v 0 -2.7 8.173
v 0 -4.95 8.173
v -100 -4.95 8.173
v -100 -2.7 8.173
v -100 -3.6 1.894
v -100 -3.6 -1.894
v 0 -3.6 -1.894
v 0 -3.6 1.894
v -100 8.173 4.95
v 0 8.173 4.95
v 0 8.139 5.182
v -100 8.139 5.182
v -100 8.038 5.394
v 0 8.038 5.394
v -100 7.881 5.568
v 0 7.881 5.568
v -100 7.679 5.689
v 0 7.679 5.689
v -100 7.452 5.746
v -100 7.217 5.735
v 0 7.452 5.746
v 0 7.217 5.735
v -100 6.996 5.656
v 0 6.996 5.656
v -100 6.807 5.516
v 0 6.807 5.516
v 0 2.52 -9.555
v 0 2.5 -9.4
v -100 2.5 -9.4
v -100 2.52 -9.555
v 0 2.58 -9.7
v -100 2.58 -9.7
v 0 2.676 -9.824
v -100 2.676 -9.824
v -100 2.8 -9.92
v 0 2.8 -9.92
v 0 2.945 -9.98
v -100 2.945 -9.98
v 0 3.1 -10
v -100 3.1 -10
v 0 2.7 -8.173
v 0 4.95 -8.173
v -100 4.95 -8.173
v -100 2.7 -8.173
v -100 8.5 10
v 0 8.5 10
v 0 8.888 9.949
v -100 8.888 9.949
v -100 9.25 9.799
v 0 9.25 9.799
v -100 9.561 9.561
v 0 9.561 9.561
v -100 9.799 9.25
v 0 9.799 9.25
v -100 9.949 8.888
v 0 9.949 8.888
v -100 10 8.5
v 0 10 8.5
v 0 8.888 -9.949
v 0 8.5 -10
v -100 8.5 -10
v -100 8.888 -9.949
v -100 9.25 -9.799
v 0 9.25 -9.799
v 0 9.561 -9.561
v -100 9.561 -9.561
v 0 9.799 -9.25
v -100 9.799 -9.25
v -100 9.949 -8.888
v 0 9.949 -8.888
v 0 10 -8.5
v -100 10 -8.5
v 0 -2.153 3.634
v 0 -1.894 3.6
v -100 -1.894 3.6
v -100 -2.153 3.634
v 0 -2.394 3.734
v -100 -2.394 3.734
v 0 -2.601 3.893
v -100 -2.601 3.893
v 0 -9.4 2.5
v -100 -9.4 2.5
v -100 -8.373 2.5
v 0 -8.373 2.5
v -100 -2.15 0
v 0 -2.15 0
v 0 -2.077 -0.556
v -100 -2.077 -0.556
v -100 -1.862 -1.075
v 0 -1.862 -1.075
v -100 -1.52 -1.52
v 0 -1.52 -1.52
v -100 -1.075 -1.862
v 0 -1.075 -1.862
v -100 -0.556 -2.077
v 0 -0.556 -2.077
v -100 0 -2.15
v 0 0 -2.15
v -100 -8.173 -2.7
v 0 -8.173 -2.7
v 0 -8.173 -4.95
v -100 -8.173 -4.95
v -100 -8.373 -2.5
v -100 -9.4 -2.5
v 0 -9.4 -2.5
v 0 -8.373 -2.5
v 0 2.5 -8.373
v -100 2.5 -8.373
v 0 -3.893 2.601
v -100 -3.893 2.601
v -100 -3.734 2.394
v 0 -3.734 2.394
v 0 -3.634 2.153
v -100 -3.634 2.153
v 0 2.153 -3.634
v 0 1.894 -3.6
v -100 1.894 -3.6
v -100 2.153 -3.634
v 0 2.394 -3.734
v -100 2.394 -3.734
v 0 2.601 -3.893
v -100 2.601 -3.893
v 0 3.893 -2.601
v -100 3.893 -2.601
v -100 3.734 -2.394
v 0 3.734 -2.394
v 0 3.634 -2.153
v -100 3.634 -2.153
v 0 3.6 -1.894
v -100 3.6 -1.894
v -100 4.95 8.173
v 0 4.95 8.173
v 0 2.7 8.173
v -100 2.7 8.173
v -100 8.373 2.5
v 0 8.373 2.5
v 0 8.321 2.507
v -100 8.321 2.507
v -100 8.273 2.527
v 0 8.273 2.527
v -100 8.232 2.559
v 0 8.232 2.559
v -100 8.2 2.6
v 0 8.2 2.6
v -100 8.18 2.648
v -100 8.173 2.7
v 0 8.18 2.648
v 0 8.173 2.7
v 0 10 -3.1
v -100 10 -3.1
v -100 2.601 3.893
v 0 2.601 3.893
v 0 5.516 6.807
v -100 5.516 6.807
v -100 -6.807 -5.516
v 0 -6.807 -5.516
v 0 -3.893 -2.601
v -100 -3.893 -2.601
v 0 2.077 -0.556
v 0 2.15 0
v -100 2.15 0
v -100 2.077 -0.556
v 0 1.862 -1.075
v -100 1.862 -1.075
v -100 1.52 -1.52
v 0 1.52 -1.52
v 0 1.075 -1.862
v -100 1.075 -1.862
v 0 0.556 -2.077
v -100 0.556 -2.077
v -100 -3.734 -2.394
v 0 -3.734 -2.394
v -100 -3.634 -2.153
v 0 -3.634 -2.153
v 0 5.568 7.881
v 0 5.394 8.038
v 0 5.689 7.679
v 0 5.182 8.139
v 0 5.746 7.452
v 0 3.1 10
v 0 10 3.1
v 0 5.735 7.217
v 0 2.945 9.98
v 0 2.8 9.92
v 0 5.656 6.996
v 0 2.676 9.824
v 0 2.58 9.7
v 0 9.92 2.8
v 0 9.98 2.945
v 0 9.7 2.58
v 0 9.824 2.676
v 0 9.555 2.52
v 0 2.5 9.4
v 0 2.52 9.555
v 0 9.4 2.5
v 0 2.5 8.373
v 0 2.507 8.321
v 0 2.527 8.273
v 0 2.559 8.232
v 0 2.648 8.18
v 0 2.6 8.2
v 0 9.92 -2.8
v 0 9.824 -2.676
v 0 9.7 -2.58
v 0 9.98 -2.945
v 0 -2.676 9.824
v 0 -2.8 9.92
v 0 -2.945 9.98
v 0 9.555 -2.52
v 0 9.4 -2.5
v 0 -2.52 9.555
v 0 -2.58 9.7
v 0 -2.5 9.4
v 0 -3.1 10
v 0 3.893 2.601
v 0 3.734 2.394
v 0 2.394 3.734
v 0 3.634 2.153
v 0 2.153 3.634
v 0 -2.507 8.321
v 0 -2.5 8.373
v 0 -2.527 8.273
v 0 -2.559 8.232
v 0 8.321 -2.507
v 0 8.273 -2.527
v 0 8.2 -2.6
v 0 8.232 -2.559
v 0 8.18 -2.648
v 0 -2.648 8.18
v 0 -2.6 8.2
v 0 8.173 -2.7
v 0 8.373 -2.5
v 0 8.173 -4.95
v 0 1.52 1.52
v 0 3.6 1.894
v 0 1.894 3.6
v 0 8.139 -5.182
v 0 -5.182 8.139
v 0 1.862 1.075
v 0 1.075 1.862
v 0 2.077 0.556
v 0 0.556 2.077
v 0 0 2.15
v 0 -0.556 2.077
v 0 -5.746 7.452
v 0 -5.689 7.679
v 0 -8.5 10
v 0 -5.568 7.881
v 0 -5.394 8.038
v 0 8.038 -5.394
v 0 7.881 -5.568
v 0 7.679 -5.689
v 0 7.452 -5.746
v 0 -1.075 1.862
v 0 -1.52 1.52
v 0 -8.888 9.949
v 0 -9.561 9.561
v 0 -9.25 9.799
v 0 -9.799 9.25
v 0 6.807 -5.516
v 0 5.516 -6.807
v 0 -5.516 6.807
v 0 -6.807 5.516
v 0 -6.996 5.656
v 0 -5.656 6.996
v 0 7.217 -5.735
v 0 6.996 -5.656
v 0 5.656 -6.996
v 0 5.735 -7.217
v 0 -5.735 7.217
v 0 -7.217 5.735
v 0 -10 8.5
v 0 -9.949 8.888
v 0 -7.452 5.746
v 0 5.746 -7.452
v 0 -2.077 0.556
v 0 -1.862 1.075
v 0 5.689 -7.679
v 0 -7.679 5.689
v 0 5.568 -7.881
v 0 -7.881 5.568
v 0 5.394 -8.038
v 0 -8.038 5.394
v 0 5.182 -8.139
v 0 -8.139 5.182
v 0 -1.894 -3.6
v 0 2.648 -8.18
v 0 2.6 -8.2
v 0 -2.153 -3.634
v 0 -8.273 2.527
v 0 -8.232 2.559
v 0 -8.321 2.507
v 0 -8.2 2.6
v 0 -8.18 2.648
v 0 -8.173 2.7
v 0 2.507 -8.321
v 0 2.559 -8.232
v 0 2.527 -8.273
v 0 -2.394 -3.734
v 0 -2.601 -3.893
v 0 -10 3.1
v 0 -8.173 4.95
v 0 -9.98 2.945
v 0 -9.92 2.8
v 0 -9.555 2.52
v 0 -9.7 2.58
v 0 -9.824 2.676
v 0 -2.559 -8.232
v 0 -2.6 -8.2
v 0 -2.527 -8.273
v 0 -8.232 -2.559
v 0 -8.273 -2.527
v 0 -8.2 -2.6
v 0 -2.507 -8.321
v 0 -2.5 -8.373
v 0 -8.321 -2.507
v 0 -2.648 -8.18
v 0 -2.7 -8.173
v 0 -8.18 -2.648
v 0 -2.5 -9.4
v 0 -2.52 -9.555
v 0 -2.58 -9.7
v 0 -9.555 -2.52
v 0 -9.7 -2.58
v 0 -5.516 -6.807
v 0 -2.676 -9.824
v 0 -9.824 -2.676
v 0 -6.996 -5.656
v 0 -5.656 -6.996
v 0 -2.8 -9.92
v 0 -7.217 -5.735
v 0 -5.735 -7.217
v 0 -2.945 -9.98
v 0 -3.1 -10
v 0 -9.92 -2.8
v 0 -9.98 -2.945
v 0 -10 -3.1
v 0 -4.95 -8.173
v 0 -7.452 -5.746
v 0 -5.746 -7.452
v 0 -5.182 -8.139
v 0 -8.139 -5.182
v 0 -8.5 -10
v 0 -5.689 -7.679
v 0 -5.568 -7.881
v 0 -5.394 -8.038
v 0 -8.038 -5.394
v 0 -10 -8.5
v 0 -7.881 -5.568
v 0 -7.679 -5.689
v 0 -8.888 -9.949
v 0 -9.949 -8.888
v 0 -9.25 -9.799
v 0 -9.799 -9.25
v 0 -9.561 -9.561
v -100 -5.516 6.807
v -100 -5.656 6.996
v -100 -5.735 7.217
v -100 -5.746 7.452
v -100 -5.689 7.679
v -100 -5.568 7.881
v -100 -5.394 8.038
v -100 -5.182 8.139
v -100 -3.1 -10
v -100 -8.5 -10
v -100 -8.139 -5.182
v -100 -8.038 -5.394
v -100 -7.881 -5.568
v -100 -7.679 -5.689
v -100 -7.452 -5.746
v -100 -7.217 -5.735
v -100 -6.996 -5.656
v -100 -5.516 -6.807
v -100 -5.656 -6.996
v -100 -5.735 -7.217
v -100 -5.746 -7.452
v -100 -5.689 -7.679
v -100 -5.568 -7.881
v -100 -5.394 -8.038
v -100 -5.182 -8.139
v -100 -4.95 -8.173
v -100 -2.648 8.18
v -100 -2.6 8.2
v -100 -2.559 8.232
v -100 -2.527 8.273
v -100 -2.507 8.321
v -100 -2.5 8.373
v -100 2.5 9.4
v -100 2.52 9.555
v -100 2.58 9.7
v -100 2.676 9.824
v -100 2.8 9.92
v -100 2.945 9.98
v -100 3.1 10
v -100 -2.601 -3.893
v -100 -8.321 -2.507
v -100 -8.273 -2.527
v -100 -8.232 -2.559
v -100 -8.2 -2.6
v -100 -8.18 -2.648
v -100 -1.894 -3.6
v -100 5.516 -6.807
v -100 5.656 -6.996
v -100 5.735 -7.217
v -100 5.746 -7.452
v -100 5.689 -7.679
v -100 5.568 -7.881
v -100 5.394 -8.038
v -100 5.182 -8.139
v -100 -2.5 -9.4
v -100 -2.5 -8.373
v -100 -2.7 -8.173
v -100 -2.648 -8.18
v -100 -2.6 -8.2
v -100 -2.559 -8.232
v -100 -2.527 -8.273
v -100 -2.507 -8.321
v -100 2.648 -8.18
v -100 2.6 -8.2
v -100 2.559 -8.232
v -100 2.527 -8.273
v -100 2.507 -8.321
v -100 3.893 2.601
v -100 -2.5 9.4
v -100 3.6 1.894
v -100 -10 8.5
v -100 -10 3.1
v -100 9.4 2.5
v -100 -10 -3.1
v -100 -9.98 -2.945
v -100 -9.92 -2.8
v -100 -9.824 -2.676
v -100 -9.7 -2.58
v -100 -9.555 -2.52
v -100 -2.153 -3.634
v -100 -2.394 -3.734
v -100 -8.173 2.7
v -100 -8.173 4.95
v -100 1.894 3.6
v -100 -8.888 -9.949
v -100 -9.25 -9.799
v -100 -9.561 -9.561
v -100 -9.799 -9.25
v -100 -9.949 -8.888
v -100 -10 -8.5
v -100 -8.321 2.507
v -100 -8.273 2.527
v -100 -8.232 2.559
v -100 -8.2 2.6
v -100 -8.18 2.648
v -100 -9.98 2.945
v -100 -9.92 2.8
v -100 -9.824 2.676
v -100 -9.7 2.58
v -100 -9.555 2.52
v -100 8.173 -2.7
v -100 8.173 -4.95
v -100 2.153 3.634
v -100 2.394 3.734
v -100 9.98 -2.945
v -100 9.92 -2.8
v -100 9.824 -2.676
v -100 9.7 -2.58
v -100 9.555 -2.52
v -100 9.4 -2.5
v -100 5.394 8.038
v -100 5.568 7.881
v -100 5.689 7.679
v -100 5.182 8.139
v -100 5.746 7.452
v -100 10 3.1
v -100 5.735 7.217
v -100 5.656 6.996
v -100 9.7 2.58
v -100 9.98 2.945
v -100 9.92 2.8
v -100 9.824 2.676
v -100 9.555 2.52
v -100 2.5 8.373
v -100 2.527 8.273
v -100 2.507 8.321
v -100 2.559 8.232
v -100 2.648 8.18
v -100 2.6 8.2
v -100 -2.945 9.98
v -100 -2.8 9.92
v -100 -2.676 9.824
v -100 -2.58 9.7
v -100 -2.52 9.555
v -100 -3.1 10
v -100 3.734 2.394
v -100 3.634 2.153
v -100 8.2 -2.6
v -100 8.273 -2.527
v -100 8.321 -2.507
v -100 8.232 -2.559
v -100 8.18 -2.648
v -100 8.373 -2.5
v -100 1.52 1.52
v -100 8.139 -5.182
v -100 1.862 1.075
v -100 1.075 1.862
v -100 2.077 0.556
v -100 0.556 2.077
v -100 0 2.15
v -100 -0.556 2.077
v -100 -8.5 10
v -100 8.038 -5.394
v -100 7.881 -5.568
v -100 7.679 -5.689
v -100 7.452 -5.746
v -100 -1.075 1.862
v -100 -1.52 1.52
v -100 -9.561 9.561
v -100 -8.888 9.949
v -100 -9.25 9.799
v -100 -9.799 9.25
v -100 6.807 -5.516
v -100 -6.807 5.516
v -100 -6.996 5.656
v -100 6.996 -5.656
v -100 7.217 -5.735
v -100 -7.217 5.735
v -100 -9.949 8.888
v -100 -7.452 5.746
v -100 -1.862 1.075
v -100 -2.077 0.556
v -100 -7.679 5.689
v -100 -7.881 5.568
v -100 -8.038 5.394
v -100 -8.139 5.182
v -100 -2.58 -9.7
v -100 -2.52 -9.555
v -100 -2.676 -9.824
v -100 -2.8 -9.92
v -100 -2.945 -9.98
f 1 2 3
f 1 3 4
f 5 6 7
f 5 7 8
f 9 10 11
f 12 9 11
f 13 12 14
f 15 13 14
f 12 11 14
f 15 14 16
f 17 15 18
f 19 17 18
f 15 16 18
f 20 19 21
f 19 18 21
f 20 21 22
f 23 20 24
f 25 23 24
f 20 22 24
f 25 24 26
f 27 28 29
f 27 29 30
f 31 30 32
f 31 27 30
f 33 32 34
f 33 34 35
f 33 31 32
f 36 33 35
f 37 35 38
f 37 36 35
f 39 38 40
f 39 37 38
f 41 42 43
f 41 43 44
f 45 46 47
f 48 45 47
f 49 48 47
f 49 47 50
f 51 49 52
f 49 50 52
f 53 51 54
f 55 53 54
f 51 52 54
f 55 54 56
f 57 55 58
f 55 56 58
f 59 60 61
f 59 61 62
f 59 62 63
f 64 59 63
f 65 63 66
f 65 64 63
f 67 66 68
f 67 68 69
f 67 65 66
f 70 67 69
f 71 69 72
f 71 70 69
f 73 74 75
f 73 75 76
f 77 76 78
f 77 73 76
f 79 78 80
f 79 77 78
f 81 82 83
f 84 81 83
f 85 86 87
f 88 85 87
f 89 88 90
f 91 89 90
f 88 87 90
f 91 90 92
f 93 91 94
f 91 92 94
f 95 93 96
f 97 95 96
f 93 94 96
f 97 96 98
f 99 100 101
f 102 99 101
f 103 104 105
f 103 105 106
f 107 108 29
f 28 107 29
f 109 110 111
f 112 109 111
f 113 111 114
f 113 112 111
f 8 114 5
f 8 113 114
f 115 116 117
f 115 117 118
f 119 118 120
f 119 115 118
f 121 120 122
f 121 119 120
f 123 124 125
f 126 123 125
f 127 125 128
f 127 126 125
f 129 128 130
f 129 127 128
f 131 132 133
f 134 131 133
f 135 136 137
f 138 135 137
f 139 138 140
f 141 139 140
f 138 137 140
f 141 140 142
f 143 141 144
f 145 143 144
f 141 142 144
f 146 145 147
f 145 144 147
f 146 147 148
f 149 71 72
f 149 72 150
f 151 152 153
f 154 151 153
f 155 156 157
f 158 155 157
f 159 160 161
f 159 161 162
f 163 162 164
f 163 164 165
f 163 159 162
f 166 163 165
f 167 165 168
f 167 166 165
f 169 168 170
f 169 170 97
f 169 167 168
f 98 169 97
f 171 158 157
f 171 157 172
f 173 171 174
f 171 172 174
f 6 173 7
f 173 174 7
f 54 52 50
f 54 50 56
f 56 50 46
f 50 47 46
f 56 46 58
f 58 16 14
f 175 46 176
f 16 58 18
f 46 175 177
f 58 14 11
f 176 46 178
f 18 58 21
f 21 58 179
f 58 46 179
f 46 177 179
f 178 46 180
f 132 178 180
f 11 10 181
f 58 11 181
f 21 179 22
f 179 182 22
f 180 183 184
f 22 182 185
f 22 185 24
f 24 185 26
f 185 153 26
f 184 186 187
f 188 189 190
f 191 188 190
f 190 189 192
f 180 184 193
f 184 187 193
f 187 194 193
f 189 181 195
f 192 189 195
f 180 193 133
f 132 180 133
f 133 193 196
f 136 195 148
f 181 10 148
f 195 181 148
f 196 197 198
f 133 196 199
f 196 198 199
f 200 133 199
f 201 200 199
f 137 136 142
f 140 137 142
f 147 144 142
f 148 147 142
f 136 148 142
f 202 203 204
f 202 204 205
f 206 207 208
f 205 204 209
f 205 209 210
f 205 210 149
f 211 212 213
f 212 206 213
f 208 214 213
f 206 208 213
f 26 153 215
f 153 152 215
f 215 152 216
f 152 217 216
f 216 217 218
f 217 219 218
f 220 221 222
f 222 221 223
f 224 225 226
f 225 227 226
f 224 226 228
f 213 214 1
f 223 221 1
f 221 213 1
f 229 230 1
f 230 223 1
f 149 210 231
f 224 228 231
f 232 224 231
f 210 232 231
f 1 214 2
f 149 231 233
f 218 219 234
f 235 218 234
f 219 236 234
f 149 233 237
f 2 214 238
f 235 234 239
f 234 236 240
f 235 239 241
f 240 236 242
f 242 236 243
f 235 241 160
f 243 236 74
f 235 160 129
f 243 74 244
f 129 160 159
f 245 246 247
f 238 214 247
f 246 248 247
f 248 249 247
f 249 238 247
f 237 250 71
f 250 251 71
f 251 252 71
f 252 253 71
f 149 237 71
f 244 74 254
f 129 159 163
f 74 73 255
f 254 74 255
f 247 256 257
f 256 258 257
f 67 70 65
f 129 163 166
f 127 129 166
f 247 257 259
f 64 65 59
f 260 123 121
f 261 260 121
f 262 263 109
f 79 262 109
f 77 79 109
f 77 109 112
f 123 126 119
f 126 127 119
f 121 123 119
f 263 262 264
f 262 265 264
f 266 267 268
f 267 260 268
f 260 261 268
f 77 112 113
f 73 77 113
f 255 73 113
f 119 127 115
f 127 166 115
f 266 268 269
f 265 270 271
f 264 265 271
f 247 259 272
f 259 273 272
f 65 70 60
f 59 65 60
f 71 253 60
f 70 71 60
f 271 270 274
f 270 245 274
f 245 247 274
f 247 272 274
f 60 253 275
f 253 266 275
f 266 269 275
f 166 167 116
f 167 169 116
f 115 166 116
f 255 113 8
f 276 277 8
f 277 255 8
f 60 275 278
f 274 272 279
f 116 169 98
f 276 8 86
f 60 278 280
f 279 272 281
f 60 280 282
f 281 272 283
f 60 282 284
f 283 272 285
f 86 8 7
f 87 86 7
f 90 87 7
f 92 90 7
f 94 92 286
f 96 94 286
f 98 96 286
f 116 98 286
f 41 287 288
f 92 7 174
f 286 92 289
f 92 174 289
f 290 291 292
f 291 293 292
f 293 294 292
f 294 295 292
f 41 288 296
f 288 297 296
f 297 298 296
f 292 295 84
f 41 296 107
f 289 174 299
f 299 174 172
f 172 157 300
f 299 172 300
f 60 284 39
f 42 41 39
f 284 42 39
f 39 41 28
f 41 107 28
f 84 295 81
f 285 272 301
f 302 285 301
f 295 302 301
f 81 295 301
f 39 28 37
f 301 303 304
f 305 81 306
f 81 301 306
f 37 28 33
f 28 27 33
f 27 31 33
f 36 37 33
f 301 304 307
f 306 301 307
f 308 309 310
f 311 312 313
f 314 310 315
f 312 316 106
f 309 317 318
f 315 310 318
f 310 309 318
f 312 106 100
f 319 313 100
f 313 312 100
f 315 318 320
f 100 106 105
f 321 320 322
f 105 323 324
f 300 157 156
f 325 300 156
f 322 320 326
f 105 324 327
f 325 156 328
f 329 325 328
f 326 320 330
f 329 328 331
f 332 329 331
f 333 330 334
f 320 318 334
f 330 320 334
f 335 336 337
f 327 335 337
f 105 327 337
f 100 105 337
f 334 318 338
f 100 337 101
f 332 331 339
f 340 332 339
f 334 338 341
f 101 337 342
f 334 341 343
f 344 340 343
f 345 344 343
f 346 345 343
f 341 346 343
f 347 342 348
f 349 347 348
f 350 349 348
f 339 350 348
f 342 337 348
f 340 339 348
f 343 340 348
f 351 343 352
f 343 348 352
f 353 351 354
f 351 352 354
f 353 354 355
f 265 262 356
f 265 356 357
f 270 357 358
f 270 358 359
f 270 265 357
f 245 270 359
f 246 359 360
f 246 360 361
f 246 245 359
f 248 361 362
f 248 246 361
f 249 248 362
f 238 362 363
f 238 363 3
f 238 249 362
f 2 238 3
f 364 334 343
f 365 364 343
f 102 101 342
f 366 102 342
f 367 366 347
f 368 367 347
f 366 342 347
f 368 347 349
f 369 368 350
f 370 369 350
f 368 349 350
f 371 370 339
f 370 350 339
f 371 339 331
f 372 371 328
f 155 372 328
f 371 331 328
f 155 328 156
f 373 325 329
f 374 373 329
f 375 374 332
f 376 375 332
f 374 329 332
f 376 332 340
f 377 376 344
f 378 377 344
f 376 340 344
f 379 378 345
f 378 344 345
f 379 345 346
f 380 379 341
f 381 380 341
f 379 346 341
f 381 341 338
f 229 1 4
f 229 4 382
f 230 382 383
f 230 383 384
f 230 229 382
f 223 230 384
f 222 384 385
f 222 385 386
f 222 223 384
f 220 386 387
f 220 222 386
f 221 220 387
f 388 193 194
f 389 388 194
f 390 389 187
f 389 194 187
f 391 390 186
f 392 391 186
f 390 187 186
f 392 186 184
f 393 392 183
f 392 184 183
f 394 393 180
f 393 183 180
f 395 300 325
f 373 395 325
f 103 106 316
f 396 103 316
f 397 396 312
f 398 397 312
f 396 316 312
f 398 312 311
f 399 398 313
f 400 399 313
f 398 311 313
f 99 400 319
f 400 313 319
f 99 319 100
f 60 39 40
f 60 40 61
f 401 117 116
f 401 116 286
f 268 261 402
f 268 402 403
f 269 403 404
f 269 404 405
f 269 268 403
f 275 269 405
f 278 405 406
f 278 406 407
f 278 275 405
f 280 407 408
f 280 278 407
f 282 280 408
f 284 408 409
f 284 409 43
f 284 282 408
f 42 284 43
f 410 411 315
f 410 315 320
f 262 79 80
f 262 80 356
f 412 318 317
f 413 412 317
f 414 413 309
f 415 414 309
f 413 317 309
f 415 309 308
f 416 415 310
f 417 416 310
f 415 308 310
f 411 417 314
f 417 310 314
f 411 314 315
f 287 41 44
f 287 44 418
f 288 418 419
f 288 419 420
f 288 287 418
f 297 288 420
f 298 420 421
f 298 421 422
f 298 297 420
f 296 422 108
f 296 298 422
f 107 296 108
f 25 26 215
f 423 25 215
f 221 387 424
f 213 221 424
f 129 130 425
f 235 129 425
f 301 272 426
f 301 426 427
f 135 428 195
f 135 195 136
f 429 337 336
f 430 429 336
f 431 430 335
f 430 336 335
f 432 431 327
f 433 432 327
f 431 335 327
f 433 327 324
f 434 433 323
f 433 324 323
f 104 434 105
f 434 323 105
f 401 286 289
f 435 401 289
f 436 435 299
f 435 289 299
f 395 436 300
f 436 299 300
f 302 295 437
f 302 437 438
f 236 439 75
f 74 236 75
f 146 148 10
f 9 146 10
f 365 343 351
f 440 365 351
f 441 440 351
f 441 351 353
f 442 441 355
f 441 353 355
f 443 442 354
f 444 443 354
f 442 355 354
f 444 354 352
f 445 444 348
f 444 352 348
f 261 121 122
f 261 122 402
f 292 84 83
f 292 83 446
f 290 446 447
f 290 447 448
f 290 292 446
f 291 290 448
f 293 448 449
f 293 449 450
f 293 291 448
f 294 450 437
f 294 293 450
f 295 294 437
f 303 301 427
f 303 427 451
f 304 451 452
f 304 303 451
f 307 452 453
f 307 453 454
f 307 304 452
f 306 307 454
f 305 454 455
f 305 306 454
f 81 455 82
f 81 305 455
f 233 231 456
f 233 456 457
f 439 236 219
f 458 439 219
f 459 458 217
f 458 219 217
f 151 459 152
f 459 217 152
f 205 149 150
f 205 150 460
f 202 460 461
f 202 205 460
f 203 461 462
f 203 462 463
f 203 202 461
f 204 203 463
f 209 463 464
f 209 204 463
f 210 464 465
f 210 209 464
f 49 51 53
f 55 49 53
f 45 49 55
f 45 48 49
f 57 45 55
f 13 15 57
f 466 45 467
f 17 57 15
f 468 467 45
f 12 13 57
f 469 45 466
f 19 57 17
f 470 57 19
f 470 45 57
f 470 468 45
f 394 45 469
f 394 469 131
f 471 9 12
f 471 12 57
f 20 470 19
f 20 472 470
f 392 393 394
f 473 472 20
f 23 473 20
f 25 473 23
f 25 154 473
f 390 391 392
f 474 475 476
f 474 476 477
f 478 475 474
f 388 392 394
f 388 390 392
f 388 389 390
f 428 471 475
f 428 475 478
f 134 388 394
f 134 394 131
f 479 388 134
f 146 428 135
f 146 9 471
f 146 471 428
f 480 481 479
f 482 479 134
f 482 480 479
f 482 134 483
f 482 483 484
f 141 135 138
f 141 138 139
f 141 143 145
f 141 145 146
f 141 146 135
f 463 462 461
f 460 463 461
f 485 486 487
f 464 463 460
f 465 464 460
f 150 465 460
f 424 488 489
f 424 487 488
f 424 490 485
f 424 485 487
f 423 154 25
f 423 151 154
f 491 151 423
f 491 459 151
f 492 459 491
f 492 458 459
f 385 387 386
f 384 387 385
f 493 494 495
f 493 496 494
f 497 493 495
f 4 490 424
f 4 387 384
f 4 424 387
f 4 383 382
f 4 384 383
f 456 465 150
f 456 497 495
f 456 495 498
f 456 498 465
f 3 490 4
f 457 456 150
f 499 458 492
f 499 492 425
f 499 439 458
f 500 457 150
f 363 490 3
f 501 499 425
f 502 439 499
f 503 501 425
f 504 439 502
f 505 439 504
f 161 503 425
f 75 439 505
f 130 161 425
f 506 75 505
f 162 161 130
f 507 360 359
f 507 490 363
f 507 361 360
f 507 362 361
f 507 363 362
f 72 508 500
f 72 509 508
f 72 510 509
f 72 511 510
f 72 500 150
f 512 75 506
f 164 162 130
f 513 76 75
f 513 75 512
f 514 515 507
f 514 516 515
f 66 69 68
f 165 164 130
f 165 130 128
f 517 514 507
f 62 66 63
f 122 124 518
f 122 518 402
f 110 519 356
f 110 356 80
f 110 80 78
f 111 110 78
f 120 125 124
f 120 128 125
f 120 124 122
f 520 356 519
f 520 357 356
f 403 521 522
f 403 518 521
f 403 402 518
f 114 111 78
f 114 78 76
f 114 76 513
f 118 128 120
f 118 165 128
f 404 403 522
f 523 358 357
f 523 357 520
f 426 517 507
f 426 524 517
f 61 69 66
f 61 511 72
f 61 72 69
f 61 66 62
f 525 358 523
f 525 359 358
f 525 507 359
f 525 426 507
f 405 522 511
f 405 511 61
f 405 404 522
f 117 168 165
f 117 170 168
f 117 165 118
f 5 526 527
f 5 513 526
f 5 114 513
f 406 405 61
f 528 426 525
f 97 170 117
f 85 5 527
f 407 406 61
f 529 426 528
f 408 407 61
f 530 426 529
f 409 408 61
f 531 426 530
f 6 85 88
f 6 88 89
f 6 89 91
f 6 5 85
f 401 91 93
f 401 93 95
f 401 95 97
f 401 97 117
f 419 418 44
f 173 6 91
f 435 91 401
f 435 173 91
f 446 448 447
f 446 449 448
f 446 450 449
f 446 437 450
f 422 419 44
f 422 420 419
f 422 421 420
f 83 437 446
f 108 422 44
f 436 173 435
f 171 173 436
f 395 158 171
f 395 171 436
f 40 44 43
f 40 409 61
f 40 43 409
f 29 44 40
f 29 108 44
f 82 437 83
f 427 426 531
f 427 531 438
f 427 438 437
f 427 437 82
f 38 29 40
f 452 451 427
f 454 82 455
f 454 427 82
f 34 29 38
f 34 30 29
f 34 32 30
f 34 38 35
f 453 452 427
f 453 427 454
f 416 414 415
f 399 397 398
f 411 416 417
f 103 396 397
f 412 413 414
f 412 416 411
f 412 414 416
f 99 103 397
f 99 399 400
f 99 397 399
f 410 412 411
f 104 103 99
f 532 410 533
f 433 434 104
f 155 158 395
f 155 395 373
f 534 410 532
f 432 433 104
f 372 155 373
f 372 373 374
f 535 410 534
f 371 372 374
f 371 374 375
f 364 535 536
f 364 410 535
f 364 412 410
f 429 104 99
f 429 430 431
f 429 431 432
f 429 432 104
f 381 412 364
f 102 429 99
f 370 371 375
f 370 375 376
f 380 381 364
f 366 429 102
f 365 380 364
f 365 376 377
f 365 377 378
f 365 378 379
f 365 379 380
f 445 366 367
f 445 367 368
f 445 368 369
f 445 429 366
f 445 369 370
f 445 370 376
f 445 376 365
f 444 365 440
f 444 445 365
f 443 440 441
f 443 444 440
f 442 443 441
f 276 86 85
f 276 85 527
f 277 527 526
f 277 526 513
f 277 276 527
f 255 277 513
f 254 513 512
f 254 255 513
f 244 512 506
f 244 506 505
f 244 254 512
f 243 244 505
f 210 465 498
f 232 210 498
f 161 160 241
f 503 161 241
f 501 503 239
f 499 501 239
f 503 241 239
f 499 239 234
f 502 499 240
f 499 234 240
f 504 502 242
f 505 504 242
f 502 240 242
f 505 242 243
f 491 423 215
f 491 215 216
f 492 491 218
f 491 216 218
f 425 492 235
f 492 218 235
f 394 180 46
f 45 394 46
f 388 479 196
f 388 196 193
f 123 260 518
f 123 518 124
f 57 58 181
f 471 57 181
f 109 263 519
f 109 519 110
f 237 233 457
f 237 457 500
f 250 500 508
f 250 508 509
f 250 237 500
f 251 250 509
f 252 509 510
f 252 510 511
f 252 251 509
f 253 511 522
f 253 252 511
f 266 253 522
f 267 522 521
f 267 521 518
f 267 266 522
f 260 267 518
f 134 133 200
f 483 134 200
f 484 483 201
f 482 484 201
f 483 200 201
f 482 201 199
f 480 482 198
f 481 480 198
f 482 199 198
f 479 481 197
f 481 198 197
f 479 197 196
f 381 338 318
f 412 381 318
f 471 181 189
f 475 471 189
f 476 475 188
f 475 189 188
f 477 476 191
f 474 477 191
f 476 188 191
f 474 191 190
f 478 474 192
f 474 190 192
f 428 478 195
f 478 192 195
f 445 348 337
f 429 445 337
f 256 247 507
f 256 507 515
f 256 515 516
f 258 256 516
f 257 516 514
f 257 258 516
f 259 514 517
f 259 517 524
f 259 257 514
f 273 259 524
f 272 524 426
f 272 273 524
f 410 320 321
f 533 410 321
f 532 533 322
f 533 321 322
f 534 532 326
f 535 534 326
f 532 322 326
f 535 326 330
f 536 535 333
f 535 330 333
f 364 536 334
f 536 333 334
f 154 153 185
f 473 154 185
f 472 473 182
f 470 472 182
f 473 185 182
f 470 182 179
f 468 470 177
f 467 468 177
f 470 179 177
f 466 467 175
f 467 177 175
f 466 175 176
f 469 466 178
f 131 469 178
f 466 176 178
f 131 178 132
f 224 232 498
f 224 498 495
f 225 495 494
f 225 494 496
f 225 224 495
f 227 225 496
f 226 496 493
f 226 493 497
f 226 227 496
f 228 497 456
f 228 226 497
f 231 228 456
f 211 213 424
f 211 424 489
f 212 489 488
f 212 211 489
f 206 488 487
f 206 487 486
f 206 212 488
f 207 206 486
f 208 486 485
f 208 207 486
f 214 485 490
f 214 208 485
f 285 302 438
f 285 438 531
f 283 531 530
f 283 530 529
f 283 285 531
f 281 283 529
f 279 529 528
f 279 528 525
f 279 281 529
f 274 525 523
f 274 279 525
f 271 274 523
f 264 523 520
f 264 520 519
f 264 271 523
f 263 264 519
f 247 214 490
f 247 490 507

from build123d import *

# Parameters (mm, degrees)
BOSS_EXTRUDE1_DEPTH = 100


with BuildPart() as part:
    # Sketch3 → Boss-Extrude1 (new body)
    with BuildSketch(Plane(origin=(0, 0, 0), x_dir=(0, 0, -1), z_dir=(1, 0, 0))):
        with BuildLine():
            Line((-5.515685425, 6.807463915), (-2.601114729, 3.892893219))
            ThreePointArc((-2.601114729, 3.892893219), (-2.27669138, 3.676120467), (-1.894007948, 3.6))
            Line((-1.894007948, 3.6), (0, 3.6))
            Line((0, 3.6), (0, 2.15))
            ThreePointArc((0, 2.15), (-1.52027958, 1.52027958), (-2.15, 0))
            Line((-2.15, 0), (-3.6, 0))
            Line((-3.6, 0), (-3.6, 1.894007948))
            ThreePointArc((-3.6, 1.894007948), (-3.676120467, 2.27669138), (-3.892893219, 2.601114729))
            Line((-3.892893219, 2.601114729), (-6.807463915, 5.515685425))
            ThreePointArc((-6.807463915, 5.515685425), (-7.679296086, 5.689103626), (-8.17314934, 4.95))
            Line((-8.17314934, 4.95), (-8.17314934, 2.7))
            ThreePointArc((-8.17314934, 2.7), (-8.231727984, 2.558578644), (-8.37314934, 2.5))
            Line((-8.37314934, 2.5), (-9.4, 2.5))
            ThreePointArc((-9.4, 2.5), (-9.824264069, 2.675735931), (-10, 3.1))
            Line((-10, 3.1), (-10, 8.5))
            ThreePointArc((-10, 8.5), (-9.560660172, 9.560660172), (-8.5, 10))
            Line((-8.5, 10), (-3.1, 10))
            ThreePointArc((-3.1, 10), (-2.675735931, 9.824264069), (-2.5, 9.4))
            Line((-2.5, 9.4), (-2.5, 8.37314934))
            ThreePointArc((-2.5, 8.37314934), (-2.558578644, 8.231727984), (-2.7, 8.17314934))
            Line((-2.7, 8.17314934), (-4.95, 8.17314934))
            ThreePointArc((-4.95, 8.17314934), (-5.689103626, 7.679296086), (-5.515685425, 6.807463915))
        make_face()
    extrude(amount=-BOSS_EXTRUDE1_DEPTH)

    # Mirror1: part across plane


with BuildPart() as part_1:
    add(part.part)
    add(part.part.mirror(Plane.ZX))

    # Mirror2: part across plane


with BuildPart() as part_2:
    add(part_1.part)
    add(part_1.part.mirror(Plane.XY))


solid = part_2.part
